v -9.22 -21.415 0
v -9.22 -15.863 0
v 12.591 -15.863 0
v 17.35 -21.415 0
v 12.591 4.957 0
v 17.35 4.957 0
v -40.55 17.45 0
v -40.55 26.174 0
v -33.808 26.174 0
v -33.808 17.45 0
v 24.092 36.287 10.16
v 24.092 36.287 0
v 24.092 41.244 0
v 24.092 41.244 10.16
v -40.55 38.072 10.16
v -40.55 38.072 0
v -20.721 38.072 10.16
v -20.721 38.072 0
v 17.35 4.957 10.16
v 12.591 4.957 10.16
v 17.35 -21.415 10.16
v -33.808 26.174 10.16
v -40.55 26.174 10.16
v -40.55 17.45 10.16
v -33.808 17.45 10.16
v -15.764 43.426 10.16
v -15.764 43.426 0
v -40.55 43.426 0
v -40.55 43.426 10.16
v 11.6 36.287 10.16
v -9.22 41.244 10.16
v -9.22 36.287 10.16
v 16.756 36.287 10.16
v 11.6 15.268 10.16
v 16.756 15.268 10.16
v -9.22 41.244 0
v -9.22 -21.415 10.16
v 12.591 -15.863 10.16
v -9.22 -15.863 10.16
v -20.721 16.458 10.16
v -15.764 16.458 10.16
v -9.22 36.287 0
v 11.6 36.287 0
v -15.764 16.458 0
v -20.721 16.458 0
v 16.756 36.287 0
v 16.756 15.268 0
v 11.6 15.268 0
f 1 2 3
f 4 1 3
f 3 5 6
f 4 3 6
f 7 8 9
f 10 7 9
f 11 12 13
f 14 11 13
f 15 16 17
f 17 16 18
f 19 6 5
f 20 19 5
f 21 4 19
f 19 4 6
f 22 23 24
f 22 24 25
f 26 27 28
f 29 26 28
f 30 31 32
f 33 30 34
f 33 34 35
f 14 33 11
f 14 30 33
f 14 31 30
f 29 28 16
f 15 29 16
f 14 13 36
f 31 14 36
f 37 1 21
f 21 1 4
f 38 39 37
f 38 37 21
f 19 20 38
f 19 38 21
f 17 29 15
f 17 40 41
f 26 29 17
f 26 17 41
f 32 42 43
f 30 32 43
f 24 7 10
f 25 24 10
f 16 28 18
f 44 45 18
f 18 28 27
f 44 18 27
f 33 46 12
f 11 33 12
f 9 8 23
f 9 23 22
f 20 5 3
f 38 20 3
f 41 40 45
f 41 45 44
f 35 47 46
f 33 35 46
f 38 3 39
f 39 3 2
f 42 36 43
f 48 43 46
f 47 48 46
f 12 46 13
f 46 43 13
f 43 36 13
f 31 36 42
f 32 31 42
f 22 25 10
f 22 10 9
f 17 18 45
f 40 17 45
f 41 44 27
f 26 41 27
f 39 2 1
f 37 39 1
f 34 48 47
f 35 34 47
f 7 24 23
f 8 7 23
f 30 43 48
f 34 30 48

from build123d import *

# Parameters (mm, degrees)
F0_W     = 6.741855
F0_H     = 8.72476
F1_DEPTH = 10.16


with BuildPart() as f1:
    # F0 (on Top) → F1 (new body)
    with BuildSketch(Plane.XY):
        Polygon((24.092233, 41.244313), (-9.220483, 41.244313), (-9.220483, 36.287062), (11.599963, 36.287062), (11.599963, 15.268327), (16.755503, 15.268327), (16.755503, 36.287062), (24.092233, 36.287062), align=None)
        Polygon((17.35037, -15.863197), (17.35037, 4.957249), (12.591412, 4.957249), (12.591412, -15.863197), (-9.220483, -15.863197), (-9.220483, -21.415316), (12.591412, -21.415316), (17.35037, -21.415316), align=None)
        Polygon((-20.721301, 43.425504), (-40.550295, 43.425504), (-40.550295, 38.071673), (-20.721301, 38.071673), (-20.721301, 16.458068), (-15.764052, 16.458068), (-15.764052, 43.425504), align=None)
        with Locations((-37.179367, 21.811897)):
            Rectangle(F0_W, F0_H)
    extrude(amount=F1_DEPTH)


solid = f1.part
